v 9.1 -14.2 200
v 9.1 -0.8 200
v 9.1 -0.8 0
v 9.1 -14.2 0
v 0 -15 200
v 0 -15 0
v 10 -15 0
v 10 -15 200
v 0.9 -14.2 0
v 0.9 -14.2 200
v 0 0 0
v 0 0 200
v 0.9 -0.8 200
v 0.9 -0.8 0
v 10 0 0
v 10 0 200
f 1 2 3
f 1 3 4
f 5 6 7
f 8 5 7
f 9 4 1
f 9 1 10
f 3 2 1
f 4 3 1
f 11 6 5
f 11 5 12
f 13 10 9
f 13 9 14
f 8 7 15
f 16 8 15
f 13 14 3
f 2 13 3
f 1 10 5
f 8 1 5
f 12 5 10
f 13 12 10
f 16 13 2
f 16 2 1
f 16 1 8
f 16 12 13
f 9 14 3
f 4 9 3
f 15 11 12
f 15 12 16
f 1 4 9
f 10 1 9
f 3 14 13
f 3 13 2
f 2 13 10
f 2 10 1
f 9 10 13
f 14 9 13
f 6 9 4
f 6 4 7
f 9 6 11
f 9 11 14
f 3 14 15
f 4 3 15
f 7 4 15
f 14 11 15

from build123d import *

# Parameters (mm, degrees)
SZKIC1_W                    = 10
SZKIC1_H                    = 15
DODANIE_WYCI_GNI_CIE3_DEPTH = 200
PODZIEL1_SURFACE_1_BACK     = 201.811
PODZIEL1_SURFACE_1_DEPTH    = 403.622
PODZIEL1_SURFACE_2_BACK     = 201.811
PODZIEL1_SURFACE_2_DEPTH    = 403.622


with BuildPart() as part:
    # Szkic1 → Dodanie-wyciągnięcie3 (new body)
    with BuildSketch(Plane.XY):
        with Locations((5, -7.5)):
            Rectangle(SZKIC1_W, SZKIC1_H)
    extrude(amount=DODANIE_WYCI_GNI_CIE3_DEPTH)


with BuildPart() as body_2:
    # Podziel1: the piece behind the surface
    add(part.part)
    # Podziel1 surface: a surface, the sketch's curves swept straight by 403.622 mm
    with BuildLine(Plane.XY.offset(200).offset(-PODZIEL1_SURFACE_1_BACK), mode=Mode.PRIVATE) as podziel1_surface_1_path:
        Line((0.9, -0.8), (9.1, -0.8))
        Line((9.1, -0.8), (9.1, -14.2))
        Line((9.1, -14.2), (0.9, -14.2))
        Line((0.9, -14.2), (0.9, -0.8))
    podziel1_surface_1 = Shell.extrude(podziel1_surface_1_path.wire(), (0 * PODZIEL1_SURFACE_1_DEPTH, 0 * PODZIEL1_SURFACE_1_DEPTH, 1 * PODZIEL1_SURFACE_1_DEPTH))
    split(bisect_by=podziel1_surface_1, keep=Keep.BOTTOM)


with BuildPart() as part_1:
    add(part.part)

    # Podziel1: split by a surface, the side it looks to stays
    # Podziel1 surface: a surface, the sketch's curves swept straight by 403.622 mm
    with BuildLine(Plane.XY.offset(200).offset(-PODZIEL1_SURFACE_2_BACK), mode=Mode.PRIVATE) as podziel1_surface_2_path:
        Line((0.9, -0.8), (9.1, -0.8))
        Line((9.1, -0.8), (9.1, -14.2))
        Line((9.1, -14.2), (0.9, -14.2))
        Line((0.9, -14.2), (0.9, -0.8))
    podziel1_surface_2 = Shell.extrude(podziel1_surface_2_path.wire(), (0 * PODZIEL1_SURFACE_2_DEPTH, 0 * PODZIEL1_SURFACE_2_DEPTH, 1 * PODZIEL1_SURFACE_2_DEPTH))
    split(bisect_by=podziel1_surface_2, keep=Keep.TOP)


solid = Compound([body_2.part, part_1.part])
